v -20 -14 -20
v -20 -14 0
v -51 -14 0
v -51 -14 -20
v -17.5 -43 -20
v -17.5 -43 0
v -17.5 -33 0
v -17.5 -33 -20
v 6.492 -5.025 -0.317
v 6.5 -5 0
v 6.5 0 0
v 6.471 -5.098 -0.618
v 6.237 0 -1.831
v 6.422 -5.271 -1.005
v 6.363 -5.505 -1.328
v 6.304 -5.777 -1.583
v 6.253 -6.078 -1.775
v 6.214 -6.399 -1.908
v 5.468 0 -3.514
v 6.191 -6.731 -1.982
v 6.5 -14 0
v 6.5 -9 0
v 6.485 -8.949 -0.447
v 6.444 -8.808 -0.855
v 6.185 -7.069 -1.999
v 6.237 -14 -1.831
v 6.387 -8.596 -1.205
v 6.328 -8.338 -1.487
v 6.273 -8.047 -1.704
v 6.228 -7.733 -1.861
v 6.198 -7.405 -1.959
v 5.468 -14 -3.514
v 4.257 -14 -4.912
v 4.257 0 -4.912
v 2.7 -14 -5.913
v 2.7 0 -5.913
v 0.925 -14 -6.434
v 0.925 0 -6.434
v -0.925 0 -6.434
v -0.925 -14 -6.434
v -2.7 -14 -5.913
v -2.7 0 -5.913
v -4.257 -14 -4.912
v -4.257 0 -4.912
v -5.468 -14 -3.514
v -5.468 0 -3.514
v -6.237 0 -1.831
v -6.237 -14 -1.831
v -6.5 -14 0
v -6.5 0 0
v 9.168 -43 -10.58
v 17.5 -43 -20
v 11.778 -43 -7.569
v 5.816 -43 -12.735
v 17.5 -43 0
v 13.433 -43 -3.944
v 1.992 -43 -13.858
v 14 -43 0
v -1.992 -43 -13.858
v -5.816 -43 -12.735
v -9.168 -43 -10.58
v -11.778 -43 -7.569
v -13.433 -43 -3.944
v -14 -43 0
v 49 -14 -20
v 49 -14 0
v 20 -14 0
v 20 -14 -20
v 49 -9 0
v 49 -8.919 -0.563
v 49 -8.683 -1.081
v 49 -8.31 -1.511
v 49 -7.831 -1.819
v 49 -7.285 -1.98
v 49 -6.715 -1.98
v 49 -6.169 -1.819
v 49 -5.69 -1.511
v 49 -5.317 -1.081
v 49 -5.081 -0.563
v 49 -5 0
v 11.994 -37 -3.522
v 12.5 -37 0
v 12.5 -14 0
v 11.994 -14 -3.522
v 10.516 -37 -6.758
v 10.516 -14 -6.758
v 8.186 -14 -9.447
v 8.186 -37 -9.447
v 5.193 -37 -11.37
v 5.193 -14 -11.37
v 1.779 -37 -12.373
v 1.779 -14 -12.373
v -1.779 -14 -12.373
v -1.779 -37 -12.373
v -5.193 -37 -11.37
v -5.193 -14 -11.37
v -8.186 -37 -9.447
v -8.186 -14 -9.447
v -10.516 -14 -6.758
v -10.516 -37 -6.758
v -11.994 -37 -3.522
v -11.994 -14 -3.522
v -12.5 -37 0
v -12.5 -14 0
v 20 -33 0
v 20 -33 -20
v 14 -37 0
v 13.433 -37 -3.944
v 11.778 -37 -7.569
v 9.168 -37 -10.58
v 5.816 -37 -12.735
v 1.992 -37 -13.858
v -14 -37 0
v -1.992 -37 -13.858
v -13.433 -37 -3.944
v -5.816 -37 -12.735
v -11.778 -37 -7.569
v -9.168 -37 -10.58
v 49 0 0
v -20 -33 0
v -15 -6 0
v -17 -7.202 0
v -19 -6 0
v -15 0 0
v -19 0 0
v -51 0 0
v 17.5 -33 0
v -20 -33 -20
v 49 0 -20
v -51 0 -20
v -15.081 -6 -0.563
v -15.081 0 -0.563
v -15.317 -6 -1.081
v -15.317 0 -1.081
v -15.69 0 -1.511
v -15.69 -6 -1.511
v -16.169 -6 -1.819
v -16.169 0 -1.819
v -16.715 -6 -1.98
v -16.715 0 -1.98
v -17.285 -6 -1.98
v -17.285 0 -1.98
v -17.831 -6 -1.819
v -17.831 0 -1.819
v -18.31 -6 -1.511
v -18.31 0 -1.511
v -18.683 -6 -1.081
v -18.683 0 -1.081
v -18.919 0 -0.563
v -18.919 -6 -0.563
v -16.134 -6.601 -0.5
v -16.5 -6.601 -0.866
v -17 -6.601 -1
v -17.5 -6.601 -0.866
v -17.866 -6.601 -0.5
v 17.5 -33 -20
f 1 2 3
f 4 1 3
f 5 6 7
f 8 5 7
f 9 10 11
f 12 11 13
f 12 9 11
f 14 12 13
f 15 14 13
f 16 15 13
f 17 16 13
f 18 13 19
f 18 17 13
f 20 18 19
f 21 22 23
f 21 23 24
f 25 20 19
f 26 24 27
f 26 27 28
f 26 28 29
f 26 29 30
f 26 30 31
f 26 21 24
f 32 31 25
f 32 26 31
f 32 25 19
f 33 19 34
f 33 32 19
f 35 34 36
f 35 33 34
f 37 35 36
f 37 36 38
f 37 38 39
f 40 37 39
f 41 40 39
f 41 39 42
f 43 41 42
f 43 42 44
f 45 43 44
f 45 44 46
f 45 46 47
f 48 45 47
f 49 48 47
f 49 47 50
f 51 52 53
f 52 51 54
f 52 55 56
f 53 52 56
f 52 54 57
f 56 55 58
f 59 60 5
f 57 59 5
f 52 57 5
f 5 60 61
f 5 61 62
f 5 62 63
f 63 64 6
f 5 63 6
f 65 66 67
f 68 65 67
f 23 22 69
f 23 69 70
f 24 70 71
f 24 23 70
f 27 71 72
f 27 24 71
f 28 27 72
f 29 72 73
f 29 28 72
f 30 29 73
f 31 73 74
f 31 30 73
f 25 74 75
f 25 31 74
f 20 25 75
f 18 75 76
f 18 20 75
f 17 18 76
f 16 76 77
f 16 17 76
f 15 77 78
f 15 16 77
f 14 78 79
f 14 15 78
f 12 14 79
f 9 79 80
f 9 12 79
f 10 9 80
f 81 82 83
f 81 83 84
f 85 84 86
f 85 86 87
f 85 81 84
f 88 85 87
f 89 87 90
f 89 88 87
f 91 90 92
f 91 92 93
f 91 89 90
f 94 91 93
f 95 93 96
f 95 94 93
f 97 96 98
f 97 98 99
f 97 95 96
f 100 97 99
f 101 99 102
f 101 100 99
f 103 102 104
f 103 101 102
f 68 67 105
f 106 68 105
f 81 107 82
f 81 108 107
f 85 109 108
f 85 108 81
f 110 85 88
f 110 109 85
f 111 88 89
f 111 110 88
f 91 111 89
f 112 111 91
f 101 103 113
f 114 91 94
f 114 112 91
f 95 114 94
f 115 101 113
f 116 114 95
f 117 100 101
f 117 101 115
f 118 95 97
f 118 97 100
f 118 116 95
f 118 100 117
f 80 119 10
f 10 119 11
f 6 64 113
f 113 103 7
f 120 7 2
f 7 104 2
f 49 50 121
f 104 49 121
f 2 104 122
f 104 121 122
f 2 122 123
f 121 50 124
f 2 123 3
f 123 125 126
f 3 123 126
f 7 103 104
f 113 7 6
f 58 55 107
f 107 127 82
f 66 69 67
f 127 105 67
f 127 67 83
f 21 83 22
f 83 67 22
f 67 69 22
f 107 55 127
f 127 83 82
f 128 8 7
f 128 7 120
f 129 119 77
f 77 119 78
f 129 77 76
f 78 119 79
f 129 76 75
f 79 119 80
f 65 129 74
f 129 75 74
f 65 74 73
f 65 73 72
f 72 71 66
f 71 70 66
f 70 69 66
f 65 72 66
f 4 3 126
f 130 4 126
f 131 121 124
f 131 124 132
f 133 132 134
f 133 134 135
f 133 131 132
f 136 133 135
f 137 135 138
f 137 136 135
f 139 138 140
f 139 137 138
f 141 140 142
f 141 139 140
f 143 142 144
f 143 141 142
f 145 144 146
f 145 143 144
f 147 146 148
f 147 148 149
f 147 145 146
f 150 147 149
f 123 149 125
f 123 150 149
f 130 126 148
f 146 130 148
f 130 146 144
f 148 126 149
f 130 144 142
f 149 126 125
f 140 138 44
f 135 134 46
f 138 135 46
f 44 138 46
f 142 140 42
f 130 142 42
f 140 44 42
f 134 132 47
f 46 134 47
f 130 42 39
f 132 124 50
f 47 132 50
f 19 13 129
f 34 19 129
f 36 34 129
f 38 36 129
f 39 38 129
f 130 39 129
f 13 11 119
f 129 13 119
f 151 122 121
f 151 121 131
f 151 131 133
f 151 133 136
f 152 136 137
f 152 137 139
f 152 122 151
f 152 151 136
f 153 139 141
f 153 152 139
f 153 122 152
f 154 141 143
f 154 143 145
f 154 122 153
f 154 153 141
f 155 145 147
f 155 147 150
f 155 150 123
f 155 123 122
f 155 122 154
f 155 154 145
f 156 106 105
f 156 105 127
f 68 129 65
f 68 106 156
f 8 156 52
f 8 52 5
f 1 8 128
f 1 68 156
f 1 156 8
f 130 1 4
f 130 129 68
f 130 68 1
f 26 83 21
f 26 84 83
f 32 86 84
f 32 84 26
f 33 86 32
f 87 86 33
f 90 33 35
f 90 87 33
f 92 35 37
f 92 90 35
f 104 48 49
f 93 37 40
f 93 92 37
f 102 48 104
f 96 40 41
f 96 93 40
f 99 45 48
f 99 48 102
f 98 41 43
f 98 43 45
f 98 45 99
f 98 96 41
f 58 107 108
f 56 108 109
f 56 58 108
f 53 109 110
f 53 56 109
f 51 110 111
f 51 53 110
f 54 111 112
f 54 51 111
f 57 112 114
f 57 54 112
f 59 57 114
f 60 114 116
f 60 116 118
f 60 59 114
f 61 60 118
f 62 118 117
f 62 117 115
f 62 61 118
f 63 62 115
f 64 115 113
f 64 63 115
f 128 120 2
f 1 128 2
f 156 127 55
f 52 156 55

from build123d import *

# Parameters (mm, degrees)
PAD_DEPTH    = 20
SKETCH002_R  = 2
POCKET_DEPTH = 50


with BuildPart() as part:
    # Sketch → Pad (new body)
    with BuildSketch(Plane.XY):
        Polygon((-51, 0), (49, 0), (49, -14), (20, -14), (20, -33), (17.5, -33), (17.5, -43), (-17.5, -43), (-17.5, -33), (-20, -33), (-20, -14), (-51, -14), align=None)
    extrude(amount=-PAD_DEPTH)

    # Sketch001 → Groove (revolve, cut)
    with BuildSketch(Plane.XY):
        Polygon((0, 0), (6.5, 0), (6.5, -14), (12.5, -14), (12.5, -37), (14, -37), (14, -45), (0, -45), align=None)
    revolve(axis=Axis((0, 0, 0), (0, 1, 0)), mode=Mode.SUBTRACT)

    # Sketch002 → Pocket (cut)
    with BuildSketch(Plane.YZ):
        with Locations((-7, 0)):
            Circle(SKETCH002_R)
    extrude(amount=POCKET_DEPTH, mode=Mode.SUBTRACT)

    # Sketch003 → Groove001 (revolve, cut)
    with BuildSketch(Plane(origin=(-17, 0, 0), x_dir=(1, 0, 0), z_dir=(0, 0, 1))):
        Polygon((0, 0), (2, 0), (2, -6), (0, -7.201721), align=None)
    revolve(axis=Axis((-17, 0, 0), (0, 1, 0)), mode=Mode.SUBTRACT)


solid = part.part
